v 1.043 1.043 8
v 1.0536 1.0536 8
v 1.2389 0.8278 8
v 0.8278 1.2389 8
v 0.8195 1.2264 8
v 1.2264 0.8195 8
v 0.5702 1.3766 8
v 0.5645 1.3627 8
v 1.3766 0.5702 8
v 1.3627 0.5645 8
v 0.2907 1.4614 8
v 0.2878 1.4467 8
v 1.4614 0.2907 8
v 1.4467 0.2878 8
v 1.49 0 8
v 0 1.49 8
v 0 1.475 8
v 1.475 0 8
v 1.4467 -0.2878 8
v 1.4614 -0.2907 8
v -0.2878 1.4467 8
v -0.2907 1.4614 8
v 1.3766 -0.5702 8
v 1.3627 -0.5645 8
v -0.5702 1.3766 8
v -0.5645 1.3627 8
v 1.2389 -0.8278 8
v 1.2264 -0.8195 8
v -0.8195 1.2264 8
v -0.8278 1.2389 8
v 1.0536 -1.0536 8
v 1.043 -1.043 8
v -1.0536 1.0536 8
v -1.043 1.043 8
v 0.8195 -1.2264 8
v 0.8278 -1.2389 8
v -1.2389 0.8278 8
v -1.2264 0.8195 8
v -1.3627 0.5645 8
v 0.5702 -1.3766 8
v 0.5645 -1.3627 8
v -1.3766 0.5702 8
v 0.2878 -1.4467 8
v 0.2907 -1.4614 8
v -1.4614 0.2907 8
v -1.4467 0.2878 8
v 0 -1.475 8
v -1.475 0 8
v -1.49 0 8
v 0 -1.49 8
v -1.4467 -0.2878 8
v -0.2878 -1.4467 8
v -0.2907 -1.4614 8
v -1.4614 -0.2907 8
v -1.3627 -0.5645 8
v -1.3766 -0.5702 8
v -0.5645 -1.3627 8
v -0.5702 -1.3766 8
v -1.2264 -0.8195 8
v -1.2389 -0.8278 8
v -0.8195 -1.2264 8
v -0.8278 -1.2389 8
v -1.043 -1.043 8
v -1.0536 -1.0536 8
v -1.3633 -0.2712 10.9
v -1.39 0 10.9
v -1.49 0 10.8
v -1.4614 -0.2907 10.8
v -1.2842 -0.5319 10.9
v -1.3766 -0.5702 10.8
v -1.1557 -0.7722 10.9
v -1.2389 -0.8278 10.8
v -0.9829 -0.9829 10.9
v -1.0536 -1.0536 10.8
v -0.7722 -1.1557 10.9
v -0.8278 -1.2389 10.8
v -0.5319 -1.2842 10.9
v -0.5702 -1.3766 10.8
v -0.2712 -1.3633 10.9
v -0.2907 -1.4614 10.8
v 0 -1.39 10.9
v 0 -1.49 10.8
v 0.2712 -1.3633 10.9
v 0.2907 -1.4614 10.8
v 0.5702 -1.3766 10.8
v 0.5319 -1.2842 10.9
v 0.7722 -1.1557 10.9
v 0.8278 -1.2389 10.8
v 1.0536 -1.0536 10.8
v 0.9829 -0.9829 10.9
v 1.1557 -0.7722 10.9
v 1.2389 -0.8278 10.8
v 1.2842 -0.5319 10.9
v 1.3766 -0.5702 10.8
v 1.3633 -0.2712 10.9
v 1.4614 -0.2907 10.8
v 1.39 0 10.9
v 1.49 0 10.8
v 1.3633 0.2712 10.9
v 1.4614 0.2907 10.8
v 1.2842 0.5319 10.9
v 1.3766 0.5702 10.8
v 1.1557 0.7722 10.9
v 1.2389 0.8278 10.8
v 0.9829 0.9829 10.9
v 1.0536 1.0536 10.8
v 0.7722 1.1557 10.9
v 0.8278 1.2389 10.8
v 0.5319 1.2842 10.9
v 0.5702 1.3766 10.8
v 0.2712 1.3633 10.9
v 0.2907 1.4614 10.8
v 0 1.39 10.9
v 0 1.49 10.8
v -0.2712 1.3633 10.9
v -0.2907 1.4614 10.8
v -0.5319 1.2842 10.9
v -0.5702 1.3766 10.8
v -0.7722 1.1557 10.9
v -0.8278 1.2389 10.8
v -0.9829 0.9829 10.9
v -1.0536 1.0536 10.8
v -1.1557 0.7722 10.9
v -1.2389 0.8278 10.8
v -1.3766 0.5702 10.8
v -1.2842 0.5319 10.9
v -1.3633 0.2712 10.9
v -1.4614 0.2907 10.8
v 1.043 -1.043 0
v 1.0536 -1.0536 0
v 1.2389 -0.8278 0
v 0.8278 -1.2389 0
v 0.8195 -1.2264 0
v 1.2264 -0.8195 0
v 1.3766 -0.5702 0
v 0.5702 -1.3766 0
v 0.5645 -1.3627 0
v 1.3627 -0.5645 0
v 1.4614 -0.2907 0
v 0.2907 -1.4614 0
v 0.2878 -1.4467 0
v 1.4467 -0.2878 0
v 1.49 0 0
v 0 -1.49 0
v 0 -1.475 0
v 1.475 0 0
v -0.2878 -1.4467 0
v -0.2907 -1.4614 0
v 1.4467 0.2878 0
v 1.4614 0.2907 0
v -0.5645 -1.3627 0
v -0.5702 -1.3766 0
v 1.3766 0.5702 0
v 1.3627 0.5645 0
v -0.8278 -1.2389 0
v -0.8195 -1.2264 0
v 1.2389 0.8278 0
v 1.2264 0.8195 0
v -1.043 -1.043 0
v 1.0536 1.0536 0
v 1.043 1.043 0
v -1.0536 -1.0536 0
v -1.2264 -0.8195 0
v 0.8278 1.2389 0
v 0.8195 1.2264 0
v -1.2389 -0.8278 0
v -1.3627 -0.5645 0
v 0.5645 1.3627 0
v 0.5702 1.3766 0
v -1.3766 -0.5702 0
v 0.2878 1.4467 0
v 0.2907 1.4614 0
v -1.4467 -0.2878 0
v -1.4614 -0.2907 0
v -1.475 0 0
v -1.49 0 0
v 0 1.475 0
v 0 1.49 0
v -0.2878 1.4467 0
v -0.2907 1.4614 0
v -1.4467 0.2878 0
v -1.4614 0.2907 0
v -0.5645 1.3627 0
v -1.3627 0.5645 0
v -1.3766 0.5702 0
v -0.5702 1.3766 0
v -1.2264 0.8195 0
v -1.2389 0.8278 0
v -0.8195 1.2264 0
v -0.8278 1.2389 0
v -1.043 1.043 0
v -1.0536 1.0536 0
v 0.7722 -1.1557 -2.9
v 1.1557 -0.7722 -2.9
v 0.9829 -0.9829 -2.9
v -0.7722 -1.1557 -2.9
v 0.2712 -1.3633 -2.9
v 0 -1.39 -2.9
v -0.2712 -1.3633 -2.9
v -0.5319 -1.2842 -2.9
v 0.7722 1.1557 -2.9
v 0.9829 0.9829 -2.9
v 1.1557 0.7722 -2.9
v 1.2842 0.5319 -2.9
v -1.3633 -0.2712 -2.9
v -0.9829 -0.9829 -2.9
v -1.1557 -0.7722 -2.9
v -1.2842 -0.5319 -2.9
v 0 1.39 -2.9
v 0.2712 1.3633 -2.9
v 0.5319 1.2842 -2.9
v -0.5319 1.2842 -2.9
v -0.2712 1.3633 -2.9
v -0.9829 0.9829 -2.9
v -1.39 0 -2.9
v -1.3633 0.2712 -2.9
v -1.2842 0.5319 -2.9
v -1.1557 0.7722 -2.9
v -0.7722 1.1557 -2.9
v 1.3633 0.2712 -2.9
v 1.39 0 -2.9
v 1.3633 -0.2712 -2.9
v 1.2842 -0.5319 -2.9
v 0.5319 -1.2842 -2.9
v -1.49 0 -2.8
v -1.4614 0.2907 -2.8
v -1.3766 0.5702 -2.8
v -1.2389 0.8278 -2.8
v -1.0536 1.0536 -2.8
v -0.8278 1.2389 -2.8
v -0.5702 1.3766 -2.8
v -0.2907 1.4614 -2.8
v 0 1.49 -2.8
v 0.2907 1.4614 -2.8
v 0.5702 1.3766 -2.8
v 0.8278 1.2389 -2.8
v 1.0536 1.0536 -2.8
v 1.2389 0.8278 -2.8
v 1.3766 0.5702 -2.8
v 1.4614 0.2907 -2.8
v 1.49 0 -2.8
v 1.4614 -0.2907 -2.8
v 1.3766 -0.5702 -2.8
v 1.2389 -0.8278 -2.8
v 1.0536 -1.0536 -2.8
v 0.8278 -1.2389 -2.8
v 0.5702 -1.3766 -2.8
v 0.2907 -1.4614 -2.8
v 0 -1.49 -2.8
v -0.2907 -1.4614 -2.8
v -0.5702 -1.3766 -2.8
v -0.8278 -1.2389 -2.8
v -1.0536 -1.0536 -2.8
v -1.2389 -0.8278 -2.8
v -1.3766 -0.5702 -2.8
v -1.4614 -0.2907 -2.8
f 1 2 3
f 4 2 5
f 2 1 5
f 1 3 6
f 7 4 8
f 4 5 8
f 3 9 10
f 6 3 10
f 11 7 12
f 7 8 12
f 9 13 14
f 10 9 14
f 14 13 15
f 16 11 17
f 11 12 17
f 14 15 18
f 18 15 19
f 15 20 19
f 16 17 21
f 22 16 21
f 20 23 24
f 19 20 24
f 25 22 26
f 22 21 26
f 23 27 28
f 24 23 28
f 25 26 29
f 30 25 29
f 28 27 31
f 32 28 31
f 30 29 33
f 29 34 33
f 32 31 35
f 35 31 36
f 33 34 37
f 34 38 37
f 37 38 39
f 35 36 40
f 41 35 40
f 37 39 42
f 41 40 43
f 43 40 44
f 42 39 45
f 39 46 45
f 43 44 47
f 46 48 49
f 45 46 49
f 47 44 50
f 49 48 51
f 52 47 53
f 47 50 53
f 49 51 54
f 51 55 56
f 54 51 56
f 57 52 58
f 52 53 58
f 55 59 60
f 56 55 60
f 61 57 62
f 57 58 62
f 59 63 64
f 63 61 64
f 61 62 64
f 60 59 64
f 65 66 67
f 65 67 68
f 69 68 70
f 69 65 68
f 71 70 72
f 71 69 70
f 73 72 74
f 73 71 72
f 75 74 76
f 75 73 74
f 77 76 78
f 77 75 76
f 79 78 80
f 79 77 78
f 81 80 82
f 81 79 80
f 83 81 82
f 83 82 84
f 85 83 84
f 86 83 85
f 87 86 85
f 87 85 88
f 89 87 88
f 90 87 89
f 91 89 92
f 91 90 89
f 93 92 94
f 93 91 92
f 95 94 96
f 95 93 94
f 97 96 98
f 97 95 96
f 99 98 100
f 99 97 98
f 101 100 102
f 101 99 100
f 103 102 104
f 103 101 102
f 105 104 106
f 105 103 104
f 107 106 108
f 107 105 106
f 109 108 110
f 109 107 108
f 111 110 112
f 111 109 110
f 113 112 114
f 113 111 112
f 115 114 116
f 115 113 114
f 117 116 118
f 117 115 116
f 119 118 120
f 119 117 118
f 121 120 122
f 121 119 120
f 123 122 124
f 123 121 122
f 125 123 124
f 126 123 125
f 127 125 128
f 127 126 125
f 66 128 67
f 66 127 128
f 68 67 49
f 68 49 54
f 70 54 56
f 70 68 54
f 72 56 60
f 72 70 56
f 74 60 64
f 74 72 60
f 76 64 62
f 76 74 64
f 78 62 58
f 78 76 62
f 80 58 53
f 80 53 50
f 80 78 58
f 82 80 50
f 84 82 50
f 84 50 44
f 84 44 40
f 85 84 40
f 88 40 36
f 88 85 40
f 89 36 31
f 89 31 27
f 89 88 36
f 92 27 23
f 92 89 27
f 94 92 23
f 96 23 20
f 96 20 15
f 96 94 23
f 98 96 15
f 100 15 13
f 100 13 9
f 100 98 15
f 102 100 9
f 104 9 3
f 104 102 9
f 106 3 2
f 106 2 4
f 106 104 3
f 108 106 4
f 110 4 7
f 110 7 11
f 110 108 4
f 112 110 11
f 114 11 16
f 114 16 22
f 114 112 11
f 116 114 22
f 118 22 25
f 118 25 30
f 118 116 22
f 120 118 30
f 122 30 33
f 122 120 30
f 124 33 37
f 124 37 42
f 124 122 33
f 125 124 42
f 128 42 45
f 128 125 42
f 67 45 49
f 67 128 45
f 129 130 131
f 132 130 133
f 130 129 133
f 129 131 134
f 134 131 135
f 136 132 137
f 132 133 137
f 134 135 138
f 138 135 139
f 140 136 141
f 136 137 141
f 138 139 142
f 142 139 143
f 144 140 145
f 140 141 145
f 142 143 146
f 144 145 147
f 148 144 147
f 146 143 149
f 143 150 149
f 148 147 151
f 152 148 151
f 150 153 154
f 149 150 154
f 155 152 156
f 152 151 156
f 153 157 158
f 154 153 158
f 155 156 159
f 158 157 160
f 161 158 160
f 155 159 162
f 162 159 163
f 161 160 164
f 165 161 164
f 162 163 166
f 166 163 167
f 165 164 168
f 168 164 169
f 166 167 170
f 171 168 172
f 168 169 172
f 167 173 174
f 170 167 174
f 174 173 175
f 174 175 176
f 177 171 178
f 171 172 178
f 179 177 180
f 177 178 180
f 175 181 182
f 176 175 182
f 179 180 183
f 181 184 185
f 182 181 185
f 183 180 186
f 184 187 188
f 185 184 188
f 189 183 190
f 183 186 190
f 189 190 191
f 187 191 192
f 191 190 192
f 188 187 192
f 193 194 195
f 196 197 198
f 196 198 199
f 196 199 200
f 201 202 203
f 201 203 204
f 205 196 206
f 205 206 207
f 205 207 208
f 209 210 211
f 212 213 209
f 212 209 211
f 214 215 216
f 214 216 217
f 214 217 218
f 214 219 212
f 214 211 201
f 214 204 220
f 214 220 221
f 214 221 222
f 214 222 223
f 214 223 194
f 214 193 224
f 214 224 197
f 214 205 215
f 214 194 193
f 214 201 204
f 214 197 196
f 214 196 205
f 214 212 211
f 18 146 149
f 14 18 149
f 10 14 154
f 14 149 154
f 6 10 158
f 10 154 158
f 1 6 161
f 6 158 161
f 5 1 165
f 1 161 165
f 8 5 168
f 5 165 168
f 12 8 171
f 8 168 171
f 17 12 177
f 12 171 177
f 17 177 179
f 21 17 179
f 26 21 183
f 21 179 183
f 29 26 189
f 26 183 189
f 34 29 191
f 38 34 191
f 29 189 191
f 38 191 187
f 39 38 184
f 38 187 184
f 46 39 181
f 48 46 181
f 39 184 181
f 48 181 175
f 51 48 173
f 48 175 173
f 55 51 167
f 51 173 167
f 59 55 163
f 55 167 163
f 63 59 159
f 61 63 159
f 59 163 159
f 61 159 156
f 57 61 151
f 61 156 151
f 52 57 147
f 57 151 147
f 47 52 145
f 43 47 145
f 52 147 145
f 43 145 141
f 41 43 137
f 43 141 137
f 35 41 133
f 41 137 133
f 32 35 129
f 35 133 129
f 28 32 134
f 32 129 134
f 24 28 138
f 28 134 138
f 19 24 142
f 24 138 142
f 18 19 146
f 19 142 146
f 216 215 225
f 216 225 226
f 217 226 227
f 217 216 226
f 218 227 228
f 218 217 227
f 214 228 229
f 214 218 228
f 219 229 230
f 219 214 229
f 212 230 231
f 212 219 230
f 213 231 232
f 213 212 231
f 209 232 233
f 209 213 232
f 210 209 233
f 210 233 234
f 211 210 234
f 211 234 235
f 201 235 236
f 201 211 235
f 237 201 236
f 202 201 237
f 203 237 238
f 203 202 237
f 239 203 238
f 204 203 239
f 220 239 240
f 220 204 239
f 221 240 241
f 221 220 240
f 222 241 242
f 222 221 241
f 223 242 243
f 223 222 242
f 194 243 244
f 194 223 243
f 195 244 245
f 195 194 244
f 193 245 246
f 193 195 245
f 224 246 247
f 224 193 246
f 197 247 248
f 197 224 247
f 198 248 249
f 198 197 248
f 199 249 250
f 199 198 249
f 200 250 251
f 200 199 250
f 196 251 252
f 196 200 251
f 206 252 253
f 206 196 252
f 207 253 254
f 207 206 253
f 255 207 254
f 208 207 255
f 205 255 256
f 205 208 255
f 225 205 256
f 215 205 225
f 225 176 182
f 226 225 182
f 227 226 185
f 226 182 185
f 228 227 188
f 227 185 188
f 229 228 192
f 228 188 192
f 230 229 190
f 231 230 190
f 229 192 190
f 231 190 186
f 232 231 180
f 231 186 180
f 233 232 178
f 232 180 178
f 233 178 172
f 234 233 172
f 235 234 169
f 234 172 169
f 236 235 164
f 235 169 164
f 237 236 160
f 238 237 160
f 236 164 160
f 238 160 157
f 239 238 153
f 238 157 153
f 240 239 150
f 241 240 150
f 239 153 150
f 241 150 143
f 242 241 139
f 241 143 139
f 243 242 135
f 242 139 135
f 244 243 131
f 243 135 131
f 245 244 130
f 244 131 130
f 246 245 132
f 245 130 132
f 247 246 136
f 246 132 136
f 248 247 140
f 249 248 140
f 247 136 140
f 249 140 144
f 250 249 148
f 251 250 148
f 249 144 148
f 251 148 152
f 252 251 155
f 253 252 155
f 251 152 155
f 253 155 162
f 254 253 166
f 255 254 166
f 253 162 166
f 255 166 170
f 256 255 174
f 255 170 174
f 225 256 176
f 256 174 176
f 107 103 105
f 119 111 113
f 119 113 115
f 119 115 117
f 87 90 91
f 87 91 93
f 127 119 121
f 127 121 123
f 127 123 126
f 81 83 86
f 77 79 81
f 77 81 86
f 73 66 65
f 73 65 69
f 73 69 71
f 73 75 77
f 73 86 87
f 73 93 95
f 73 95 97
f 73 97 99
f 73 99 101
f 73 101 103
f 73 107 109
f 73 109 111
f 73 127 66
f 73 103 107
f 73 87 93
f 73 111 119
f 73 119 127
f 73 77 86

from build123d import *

# Parameters (mm, degrees)
SKETCH_1_R      = 1.475
EXTRUDE_1_DEPTH = 8
SKETCH_2_R      = 1.49
EXTRUDE_2_DEPTH = 2.9
EXTRUDE_START   = 2.9
SKETCH_3_R      = 1.49
EXTRUDE_3_DEPTH = 2.9
CHAMFER_1_SIZE  = 0.1


with BuildPart() as part:
    # 스케치1 → 보스-돌출1 (new body)
    with BuildSketch(Plane.XY):
        Circle(SKETCH_1_R)
    extrude(amount=EXTRUDE_1_DEPTH)

    # 스케치2 → 보스-돌출2 (add)
    with BuildSketch(Plane(origin=(0, 0, 0), x_dir=(-1, 0, 0), z_dir=(0, 0, -1))):
        Circle(SKETCH_2_R)
    extrude(amount=EXTRUDE_2_DEPTH)

    # 스케치3 → 보스-돌출3 (add)
    with BuildSketch(Plane.XY.offset(8).offset(EXTRUDE_START)):
        with Locations(Location((0, 0, 0), (0, 0, 180))):
            Circle(SKETCH_3_R)
    extrude(amount=-EXTRUDE_3_DEPTH)

    # 모따기1
    chamfer_1_edges = [part.edges().sort_by_distance(p)[0] for p in [
        (1.49, 0, -2.9),
        (1.49, 0, 10.9),
    ]]
    chamfer(chamfer_1_edges, length=CHAMFER_1_SIZE)


solid = part.part
